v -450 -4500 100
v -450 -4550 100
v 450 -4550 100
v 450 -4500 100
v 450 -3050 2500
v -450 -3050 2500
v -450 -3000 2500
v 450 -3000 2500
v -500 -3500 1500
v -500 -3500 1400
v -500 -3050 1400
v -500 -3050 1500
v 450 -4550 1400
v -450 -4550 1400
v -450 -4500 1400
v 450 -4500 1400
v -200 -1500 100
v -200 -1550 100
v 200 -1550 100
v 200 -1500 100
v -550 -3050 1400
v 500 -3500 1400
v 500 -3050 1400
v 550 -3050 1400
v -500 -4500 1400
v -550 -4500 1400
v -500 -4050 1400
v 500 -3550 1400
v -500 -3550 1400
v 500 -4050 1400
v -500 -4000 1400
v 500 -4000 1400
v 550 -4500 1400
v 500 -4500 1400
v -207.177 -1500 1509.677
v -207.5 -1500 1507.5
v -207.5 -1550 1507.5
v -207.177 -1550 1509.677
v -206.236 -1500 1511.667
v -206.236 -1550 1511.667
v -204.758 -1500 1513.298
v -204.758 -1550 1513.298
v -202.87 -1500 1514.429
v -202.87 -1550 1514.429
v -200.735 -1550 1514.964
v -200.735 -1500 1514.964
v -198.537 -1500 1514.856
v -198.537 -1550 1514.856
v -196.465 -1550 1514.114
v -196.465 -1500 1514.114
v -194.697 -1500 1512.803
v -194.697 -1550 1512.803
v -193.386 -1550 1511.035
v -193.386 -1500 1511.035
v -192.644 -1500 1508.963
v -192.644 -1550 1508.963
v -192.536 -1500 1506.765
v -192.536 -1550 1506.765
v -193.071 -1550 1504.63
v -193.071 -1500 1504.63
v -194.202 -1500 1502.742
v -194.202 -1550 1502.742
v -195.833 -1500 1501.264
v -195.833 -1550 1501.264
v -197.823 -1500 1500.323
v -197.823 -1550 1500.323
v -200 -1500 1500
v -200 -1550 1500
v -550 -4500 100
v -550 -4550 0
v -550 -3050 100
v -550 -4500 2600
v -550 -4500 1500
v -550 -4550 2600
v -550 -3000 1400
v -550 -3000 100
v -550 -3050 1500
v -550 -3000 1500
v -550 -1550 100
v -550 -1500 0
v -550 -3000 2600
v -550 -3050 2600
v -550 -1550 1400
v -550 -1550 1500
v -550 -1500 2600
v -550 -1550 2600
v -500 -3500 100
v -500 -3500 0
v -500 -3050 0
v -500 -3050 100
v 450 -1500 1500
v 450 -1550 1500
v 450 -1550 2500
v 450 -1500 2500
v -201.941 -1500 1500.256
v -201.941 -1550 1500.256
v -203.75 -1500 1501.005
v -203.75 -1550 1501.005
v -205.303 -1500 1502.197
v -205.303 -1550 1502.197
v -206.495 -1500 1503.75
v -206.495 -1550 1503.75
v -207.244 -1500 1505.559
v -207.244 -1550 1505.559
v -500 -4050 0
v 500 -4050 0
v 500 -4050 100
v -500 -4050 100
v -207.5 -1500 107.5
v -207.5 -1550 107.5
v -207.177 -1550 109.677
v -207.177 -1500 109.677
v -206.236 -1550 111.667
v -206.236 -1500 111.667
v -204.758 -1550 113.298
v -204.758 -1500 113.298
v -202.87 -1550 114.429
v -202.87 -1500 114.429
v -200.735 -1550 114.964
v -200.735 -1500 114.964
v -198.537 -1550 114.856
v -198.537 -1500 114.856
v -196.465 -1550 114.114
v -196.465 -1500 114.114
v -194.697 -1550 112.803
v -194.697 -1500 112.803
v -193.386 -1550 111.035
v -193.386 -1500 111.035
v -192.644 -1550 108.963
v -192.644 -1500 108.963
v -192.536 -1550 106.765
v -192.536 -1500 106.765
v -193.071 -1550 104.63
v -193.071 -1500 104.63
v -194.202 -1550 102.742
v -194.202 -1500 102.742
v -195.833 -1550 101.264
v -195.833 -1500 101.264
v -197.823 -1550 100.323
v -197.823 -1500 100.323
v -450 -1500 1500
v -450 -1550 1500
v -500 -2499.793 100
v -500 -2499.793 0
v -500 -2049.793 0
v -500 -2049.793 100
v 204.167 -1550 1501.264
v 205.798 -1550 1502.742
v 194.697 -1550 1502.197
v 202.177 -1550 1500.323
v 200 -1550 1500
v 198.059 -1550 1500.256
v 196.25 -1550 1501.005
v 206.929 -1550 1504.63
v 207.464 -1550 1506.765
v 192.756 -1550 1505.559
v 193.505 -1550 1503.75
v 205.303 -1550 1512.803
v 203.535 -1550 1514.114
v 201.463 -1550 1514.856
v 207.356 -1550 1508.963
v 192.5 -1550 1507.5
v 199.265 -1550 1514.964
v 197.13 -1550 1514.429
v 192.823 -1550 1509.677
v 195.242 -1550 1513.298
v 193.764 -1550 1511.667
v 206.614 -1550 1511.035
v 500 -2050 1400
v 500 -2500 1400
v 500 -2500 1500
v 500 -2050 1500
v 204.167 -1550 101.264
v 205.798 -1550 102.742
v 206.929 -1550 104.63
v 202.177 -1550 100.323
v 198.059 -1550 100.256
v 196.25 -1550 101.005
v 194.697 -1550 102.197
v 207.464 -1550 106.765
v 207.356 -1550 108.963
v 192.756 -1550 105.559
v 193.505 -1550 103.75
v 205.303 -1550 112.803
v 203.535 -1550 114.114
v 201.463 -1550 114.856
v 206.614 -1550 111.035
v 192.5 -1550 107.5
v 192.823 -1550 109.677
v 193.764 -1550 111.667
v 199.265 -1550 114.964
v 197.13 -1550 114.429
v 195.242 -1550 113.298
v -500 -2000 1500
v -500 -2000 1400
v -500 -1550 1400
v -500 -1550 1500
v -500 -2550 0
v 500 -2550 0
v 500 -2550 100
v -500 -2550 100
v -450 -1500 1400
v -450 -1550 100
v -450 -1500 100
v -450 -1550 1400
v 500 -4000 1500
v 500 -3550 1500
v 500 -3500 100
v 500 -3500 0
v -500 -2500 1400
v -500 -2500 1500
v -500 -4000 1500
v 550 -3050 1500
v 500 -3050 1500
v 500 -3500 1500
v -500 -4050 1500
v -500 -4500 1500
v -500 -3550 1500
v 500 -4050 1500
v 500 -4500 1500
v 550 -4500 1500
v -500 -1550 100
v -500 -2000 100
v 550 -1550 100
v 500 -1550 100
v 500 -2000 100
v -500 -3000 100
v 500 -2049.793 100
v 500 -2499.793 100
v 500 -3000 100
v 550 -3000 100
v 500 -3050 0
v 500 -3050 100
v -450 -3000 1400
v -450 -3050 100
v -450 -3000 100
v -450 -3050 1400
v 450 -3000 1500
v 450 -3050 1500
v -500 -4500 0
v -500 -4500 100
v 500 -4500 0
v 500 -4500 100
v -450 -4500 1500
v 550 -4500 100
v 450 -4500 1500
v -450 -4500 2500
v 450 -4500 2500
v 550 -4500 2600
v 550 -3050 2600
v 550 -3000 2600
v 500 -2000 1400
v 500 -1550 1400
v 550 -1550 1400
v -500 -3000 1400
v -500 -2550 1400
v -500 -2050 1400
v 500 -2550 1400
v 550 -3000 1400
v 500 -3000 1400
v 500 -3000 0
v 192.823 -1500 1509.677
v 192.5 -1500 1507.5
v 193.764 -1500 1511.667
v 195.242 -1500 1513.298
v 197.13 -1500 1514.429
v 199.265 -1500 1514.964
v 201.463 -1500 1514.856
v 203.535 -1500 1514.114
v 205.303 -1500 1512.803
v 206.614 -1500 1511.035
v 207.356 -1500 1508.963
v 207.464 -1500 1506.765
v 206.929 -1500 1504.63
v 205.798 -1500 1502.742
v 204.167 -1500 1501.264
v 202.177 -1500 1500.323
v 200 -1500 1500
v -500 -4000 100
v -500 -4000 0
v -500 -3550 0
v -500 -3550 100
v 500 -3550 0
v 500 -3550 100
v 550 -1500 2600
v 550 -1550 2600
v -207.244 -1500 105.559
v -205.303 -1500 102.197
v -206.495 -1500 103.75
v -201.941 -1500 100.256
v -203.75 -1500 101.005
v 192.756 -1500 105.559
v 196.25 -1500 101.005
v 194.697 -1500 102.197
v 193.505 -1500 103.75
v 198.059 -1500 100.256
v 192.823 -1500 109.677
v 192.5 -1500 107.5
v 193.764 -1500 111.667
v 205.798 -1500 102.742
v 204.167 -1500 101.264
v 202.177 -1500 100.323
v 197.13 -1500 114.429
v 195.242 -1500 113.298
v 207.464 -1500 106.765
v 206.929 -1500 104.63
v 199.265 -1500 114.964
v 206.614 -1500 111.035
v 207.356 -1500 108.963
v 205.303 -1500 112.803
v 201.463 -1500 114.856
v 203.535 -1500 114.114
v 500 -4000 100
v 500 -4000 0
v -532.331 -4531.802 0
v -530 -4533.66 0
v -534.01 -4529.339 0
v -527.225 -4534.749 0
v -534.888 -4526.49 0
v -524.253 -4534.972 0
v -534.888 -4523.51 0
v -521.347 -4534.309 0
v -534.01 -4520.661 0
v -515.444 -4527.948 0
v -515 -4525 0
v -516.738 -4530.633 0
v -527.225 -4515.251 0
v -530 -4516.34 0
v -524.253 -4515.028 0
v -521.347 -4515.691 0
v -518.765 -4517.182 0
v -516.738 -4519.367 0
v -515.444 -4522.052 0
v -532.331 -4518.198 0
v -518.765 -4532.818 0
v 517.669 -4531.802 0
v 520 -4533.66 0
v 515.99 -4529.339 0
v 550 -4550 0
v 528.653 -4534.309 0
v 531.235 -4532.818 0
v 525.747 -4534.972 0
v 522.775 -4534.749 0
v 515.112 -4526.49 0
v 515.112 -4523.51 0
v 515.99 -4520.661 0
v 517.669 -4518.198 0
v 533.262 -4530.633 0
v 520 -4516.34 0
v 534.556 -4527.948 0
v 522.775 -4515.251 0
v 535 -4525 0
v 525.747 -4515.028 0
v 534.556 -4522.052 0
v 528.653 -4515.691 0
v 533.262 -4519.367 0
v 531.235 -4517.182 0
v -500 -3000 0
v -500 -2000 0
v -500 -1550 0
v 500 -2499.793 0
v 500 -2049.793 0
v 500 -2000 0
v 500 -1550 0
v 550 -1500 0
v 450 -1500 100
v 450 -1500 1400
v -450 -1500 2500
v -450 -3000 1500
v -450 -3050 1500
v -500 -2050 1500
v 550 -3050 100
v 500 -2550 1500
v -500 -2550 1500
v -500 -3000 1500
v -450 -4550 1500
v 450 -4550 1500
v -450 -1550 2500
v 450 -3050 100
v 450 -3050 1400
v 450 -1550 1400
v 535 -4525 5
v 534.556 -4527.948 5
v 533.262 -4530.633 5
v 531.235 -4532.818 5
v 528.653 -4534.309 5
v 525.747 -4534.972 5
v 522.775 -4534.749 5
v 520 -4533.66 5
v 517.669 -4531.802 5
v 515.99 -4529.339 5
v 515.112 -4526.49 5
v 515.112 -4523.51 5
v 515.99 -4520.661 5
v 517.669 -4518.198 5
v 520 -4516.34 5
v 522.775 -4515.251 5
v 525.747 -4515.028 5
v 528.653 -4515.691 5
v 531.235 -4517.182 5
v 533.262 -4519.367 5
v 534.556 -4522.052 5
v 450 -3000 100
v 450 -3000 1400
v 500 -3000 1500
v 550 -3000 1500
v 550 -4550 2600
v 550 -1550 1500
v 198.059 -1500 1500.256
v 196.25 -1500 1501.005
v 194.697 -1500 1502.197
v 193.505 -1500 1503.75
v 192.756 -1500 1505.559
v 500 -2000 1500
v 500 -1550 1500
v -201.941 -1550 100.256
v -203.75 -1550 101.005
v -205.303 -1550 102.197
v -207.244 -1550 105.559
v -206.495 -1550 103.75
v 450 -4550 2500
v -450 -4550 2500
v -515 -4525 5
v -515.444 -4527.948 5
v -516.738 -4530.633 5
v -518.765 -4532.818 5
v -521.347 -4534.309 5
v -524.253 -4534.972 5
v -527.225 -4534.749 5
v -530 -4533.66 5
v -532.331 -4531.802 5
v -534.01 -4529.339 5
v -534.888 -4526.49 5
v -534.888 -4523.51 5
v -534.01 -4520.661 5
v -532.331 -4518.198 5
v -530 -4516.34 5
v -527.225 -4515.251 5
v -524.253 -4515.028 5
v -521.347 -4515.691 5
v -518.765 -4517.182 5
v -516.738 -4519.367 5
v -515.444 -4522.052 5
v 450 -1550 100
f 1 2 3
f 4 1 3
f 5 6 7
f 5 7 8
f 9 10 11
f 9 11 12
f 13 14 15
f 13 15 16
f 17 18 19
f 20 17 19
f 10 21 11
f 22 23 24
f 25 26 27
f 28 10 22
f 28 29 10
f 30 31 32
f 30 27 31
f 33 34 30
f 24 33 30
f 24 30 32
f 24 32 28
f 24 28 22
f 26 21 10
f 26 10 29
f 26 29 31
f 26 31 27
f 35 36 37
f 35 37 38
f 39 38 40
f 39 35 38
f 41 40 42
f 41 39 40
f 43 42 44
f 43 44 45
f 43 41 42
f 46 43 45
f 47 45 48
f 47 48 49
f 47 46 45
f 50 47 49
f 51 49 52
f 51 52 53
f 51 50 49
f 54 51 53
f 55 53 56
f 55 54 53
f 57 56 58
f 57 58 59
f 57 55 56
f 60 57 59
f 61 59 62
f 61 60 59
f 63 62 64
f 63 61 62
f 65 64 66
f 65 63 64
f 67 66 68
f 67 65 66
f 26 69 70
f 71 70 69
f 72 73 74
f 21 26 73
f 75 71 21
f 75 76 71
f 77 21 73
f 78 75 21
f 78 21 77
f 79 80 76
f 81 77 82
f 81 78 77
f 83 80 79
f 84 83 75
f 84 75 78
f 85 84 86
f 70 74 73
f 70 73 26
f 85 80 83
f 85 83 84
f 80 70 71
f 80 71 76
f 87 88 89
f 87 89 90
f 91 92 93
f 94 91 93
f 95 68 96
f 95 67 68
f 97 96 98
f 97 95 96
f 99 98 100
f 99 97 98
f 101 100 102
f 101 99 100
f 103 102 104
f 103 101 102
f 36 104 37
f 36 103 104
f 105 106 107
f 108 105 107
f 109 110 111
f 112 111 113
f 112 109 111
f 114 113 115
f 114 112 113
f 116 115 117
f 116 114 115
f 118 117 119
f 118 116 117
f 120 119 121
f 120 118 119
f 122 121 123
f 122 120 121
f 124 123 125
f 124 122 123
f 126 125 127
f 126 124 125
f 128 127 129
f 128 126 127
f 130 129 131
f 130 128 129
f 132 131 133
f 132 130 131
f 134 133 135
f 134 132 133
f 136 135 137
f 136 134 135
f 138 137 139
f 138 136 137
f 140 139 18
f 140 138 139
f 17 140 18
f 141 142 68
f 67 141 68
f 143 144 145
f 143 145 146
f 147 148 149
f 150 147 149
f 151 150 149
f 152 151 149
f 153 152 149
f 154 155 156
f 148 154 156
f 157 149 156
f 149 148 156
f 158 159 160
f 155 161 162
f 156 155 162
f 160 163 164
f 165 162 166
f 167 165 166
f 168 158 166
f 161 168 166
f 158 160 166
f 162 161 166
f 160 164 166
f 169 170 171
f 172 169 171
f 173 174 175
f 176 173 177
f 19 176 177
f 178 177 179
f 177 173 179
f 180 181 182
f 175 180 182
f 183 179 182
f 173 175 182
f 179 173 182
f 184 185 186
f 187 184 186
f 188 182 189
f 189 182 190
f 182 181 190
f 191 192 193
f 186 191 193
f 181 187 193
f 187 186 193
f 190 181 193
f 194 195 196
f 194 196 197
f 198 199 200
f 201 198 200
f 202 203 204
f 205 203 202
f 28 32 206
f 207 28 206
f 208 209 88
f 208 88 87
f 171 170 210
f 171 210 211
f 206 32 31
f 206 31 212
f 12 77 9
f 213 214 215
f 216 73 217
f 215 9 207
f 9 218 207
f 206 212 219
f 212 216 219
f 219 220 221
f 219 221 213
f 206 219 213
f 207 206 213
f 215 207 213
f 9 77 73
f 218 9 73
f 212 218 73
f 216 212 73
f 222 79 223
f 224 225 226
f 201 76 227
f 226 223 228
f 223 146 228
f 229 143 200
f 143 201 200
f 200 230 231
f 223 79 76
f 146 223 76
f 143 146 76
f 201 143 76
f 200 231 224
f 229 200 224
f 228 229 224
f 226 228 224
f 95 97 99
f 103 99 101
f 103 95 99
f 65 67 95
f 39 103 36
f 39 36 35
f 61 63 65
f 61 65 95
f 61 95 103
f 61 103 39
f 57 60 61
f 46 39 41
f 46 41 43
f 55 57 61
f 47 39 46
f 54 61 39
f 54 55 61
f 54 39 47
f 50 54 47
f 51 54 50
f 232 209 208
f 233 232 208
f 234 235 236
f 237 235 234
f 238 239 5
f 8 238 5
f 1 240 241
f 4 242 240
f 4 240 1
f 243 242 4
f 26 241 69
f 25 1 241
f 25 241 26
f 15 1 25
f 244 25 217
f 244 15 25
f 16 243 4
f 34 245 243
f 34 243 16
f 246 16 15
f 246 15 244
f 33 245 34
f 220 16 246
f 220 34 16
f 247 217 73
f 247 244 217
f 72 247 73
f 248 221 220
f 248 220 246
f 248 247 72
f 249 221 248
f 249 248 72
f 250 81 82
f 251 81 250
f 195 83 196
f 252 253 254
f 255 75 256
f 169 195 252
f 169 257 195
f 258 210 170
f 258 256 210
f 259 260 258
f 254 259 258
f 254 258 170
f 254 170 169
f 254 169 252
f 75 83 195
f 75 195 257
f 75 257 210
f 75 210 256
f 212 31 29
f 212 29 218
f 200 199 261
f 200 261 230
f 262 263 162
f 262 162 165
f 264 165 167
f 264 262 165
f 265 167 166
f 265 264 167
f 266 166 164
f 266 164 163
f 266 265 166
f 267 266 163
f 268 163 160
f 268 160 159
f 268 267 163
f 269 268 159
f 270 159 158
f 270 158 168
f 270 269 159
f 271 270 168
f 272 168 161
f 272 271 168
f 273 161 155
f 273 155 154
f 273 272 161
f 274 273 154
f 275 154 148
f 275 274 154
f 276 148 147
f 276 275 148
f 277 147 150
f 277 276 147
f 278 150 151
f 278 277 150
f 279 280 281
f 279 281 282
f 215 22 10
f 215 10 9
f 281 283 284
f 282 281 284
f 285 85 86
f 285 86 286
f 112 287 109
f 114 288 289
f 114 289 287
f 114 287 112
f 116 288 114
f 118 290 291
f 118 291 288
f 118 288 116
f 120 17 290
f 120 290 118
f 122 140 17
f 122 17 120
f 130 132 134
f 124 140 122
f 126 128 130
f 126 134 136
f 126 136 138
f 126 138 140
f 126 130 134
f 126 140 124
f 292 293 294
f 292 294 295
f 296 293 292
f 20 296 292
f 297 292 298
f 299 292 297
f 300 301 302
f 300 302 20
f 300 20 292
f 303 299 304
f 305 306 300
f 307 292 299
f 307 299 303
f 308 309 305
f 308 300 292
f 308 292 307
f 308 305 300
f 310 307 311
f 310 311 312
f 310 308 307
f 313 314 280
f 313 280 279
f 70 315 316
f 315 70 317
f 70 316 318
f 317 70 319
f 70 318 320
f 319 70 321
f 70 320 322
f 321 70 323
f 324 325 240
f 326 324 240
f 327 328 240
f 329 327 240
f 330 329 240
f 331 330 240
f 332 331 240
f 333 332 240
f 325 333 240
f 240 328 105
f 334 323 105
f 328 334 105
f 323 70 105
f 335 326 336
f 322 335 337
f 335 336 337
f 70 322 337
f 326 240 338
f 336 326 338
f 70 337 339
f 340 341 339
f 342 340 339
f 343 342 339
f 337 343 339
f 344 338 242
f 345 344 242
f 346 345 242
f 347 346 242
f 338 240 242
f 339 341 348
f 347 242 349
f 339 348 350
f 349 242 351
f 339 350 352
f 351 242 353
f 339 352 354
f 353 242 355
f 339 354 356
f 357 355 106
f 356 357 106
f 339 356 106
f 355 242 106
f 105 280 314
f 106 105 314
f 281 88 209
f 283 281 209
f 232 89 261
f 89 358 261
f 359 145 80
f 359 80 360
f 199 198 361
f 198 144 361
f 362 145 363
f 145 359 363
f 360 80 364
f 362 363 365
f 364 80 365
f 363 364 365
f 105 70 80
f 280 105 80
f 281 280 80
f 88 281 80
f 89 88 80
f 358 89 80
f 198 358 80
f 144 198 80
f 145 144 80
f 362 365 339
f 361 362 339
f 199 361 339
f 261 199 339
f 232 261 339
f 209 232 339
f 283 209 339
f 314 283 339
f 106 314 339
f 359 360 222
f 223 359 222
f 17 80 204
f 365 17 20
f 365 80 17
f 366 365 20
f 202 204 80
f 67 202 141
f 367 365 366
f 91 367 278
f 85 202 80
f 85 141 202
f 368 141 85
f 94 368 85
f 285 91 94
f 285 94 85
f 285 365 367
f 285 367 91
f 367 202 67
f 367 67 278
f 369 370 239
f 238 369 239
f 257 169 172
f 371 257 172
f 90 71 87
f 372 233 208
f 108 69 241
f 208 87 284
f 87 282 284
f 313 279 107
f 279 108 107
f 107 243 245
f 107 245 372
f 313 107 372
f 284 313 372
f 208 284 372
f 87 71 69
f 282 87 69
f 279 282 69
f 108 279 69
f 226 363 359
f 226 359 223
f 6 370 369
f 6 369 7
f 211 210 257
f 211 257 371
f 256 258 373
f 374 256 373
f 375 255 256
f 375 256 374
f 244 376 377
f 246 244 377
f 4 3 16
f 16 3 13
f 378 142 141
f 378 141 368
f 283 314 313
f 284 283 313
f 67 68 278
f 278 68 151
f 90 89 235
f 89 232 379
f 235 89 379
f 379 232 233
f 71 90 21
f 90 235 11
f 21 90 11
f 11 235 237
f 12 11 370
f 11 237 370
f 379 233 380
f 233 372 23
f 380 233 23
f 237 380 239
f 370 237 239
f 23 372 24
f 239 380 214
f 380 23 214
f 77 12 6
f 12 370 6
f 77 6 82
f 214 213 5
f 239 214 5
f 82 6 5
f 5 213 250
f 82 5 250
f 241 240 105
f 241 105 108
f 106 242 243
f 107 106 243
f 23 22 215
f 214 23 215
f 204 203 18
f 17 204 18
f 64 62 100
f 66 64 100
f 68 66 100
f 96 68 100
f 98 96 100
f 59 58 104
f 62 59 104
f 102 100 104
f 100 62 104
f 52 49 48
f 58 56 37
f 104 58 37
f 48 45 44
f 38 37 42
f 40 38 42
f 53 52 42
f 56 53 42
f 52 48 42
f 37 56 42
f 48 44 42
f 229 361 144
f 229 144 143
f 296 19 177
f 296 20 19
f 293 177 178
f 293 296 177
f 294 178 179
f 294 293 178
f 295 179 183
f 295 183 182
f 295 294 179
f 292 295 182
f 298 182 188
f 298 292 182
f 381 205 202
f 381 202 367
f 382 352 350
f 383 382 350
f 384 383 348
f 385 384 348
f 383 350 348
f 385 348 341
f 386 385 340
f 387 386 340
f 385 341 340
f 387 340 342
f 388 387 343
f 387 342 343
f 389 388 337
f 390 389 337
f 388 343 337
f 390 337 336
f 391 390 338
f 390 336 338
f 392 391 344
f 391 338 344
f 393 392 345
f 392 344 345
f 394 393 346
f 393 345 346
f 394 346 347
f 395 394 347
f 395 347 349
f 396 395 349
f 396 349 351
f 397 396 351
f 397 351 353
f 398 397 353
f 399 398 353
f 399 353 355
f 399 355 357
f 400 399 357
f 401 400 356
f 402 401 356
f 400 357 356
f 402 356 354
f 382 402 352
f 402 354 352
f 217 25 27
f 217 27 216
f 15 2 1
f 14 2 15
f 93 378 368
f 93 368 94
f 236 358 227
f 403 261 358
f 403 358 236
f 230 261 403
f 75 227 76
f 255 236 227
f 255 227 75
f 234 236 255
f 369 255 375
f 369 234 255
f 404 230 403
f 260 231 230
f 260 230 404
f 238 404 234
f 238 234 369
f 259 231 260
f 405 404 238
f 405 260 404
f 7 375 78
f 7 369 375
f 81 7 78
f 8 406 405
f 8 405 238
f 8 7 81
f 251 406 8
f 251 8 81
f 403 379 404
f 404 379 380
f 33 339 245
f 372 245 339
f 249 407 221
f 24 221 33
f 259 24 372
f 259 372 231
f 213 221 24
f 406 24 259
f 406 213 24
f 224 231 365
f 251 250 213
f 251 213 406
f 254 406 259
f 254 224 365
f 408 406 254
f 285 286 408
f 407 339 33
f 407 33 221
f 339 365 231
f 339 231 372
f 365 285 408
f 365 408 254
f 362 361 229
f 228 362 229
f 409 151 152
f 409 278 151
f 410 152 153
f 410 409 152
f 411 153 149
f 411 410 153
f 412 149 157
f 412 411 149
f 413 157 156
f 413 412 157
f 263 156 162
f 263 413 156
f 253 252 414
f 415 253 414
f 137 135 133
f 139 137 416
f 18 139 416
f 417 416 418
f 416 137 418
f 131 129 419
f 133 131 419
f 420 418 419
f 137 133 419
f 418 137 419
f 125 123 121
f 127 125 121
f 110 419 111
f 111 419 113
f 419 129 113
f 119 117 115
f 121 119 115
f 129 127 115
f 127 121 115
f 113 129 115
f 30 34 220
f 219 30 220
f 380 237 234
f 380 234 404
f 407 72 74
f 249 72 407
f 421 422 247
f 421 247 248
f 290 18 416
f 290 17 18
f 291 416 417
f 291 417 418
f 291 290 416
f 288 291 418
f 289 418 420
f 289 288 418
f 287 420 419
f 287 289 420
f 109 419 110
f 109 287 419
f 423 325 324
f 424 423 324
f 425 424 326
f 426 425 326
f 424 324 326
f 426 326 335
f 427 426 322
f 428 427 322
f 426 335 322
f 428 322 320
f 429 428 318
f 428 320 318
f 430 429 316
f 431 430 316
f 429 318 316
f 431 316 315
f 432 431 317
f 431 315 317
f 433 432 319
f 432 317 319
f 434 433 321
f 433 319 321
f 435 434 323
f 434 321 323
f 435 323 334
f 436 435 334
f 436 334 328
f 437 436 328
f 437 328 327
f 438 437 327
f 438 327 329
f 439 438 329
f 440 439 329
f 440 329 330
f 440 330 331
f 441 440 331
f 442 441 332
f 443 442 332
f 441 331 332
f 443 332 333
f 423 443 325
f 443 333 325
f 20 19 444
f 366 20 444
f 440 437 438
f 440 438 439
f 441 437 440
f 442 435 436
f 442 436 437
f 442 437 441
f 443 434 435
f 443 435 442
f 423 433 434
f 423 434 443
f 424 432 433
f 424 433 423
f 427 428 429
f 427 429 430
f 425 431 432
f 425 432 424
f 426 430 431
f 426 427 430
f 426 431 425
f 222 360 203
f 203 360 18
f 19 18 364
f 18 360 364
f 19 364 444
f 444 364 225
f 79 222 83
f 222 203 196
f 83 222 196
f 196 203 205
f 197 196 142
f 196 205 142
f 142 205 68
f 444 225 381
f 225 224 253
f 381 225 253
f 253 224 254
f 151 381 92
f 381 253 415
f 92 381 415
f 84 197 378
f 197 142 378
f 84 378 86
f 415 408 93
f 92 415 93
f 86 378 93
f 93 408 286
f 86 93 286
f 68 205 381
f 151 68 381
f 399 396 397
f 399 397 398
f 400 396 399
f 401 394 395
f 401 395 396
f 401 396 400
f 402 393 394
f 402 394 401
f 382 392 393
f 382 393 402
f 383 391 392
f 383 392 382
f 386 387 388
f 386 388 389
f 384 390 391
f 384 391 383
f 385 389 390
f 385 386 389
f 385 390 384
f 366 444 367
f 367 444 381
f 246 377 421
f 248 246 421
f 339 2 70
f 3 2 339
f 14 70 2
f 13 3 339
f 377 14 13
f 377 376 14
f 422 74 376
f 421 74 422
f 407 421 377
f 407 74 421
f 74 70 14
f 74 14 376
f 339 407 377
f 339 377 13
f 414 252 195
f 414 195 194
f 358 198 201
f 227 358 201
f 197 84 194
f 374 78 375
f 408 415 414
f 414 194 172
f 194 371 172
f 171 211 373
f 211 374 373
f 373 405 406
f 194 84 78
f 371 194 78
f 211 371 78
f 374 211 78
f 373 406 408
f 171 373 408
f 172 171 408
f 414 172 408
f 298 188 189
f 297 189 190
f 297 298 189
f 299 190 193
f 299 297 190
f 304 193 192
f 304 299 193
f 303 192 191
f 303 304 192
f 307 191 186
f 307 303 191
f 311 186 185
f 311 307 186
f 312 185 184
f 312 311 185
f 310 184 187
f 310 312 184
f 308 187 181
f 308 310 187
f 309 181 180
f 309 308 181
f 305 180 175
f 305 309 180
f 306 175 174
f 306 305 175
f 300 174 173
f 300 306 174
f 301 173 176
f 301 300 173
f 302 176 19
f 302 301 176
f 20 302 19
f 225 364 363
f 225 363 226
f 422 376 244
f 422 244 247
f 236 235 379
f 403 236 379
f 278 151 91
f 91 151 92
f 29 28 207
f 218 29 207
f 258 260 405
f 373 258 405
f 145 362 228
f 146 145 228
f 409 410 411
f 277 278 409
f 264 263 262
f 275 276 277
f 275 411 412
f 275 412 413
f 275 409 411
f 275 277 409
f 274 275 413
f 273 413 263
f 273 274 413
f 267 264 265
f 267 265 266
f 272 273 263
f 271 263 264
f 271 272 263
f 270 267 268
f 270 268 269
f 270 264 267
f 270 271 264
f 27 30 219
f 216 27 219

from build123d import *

# Parameters (mm, degrees)
F1_W      = 1100
F1_H      = 2600
F2_DEPTH  = 4550
F3_W      = 900
F3_H      = 1300
F3_H_2    = 1000
F4_DEPTH  = 20000
F5_W      = 1450
F5_H      = 4290.098786
F5_H_2    = 4287.803769
F6_DEPTH  = 2000
F7_W      = 50
F7_H      = 100
F8_DEPTH  = 4550
F10_W     = 50
F10_H     = 100
F10_W_2   = 50.206947
F10_W_3   = 49.793053
F11_DEPTH = 1050
F9_R      = 7.5
F12_DEPTH = 1550
F13_W     = 1620.942185
F13_H     = 2600
F14_DEPTH = 1200
F15_R     = 10
F16_DEPTH = 5


with BuildPart() as f2:
    # F1 (on Front) → F2 (new body)
    with BuildSketch(Plane.XZ):
        with Locations((0, 1300)):
            Rectangle(F1_W, F1_H)
    extrude(amount=F2_DEPTH)

    # F3 (on face) → F4 (cut)
    with BuildSketch(Plane.XZ.offset(4550)):
        with Locations((0, 750)):
            Rectangle(F3_W, F3_H)
        with Locations((0, 2000)):
            Rectangle(F3_W, F3_H_2)
    extrude(amount=-F4_DEPTH, mode=Mode.SUBTRACT)

    # F5 (on face) → F6 (cut)
    with BuildSketch(Plane.YZ.offset(550)):
        with Locations((-2275, 1869.349897)):
            Rectangle(F5_W, F5_H)
        with Locations((-3775, 1868.202388)):
            Rectangle(F5_W, F5_H_2)
    extrude(amount=-F6_DEPTH, mode=Mode.SUBTRACT)

    # F7 (on face) → F8 (join)
    with BuildSketch(Plane.XZ.offset(4550)):
        with Locations((525, 1450)):
            Rectangle(F7_W, F7_H)
        with Locations((-525, 1450)):
            Rectangle(F7_W, F7_H)
        with Locations((-525, 50)):
            Rectangle(F7_W, F7_H)
        with Locations((525, 50)):
            Rectangle(F7_W, F7_H)
    extrude(amount=-F8_DEPTH)

    # F10 (on face) → F11 (join, through all)
    with BuildSketch(Plane.YZ.offset(550)):
        with Locations((-2525, 1450)):
            Rectangle(F10_W, F10_H)
        with Locations((-2025, 1450)):
            Rectangle(F10_W, F10_H)
        with Locations((-4025, 1450)):
            Rectangle(F10_W, F10_H)
        with Locations((-3525, 1450)):
            Rectangle(F10_W, F10_H)
        with Locations((-4025, 50)):
            Rectangle(F10_W, F10_H)
        with Locations((-3525, 50)):
            Rectangle(F10_W, F10_H)
        with Locations((-2524.896526, 50)):
            Rectangle(F10_W_2, F10_H)
        with Locations((-2024.896526, 50)):
            Rectangle(F10_W_3, F10_H)
    extrude(amount=-F11_DEPTH)

    # F9 (on face) → F12 (join, through all)
    with BuildSketch(Plane(origin=(0, 0, 0), x_dir=(-1, 0, 0), z_dir=(0, 1, 0))):
        with Locations((200, 1507.5)):
            Circle(F9_R)
        with Locations((-200, 1507.5)):
            Circle(F9_R)
        with Locations((200, 107.5)):
            Circle(F9_R)
        with Locations((-200, 107.5)):
            Circle(F9_R)
    extrude(amount=-F12_DEPTH)

    # F13 (on face) → F14 (cut)
    with BuildSketch(Plane.YZ.offset(550)):
        with Locations((-689.528908, 1300)):
            Rectangle(F13_W, F13_H)
    extrude(amount=-F14_DEPTH, mode=Mode.SUBTRACT)

    # F15 (on face) → F16 (cut)
    with BuildSketch(Plane(origin=(0, 0, 0), x_dir=(1, 0, 0), z_dir=(0, 0, -1))):
        with Locations((525, 4525)):
            Circle(F15_R)
        with Locations((-525, 4525)):
            Circle(F15_R)
    extrude(amount=-F16_DEPTH, mode=Mode.SUBTRACT)


solid = f2.part
